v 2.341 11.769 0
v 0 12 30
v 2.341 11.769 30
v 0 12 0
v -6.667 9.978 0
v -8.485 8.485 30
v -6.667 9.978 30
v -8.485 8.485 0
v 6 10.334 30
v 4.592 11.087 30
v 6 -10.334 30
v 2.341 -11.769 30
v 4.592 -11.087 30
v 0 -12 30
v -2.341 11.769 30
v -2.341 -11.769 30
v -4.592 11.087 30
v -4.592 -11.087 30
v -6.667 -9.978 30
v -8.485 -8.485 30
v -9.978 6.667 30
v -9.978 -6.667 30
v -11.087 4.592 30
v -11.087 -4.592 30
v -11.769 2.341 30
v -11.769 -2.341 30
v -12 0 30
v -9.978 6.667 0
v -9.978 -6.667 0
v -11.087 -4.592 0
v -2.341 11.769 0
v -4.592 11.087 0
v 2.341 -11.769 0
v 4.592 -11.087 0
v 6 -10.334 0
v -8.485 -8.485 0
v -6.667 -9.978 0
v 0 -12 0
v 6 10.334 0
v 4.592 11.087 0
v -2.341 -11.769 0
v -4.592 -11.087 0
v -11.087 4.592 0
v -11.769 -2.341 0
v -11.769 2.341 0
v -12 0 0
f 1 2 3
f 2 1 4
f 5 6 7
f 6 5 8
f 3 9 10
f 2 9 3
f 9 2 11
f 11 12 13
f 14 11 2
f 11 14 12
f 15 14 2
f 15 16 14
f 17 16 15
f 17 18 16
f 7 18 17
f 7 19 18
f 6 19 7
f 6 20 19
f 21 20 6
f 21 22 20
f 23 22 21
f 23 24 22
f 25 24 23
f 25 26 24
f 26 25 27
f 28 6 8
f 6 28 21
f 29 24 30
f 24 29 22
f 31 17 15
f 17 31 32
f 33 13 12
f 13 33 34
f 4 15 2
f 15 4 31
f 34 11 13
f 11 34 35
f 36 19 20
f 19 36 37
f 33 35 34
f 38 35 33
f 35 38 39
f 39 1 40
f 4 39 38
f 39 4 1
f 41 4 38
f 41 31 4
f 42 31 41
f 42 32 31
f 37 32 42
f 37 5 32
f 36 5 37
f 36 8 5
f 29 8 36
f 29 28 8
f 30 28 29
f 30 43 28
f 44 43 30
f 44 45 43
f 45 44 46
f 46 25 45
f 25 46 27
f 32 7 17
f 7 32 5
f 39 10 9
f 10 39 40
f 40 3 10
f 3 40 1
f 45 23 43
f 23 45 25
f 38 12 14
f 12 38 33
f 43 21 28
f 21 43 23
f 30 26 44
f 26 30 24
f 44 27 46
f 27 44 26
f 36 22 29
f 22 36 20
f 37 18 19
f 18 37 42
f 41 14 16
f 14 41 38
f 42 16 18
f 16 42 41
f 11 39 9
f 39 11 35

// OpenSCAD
// A declared cylinder whose region is larger than the band that writes it.
//
// This fixture exists because of a regression that shipped green. On
// 2026-09-22 a region rule (R0 of doc/step-rungs.md) made the band pass give
// a region up when the surface covered more than the ring, in the hope the
// trimmed-quadric pass would write the whole of it. On lid10's *exact* tier
// that pass then refused - "the surface is exact but some of it is bounded off
// itself, and half a surface is worse than none" - and 56 facets that had been
// an exact conical face came out as planes. Cone faces 9 to 8, LINE 3466 to
// 3633, on a run that passed 56 of 56.
//
// Nothing saw it. lid10 is not a fixture, the flagship checks run with both
// feature flags, and no fixture asserted the exact tier's analytic coverage on
// a model where a region rule fires. This fixture is that assertion.
//
// **What it does and does not catch, mutation-checked against the parked
// attempt rather than assumed.** Rebuilt with
// `claude/step-region-r0-optimistic-parked` in the tree, this model exports
// identically and the test still passes: that rule does not fire here, because
// the two facets the cut clips have vertices on a *chord* of the wall, up to
// the sagitta inside the true cylinder, so at 1e-7 they are not on the declared
// surface and the region is exactly the ring. What this fixture guards is the
// *class* - a declared quadric written as an analytic face at the exact tier,
// with facets of the same surface beside it, so that anything which surrenders
// the band turns twenty facets into twenty planes and the count says so. The
// companion `step-region-pocket.scad` is the model where a region rule does
// fire, and it carries a derived volume.
//
// What it is: a 32-gon cylinder with one flat milled down its whole height.
// Everything below follows from r = 12, x = 6 and $fn = 32, and from nothing
// measured off the mesh.
//
//   the flat meets the cylinder where cos(theta) = 6/12, so at theta = +/-60
//   a facet spans 360/32 = 11.25 degrees, and 60/11.25 = 5.333 - NOT a facet
//   boundary, which is the whole point: the cut falls *inside* a facet at each
//   end
//   facets wholly removed: those between -60 and +60, which is 5 either side
//   of 0, so 10
//   facets clipped: the two the cut falls inside
//   facets left whole: 32 - 10 - 2 = 20
//
// So one partial band of 20, and two facets of the same declared cylinder that
// the band cannot hold because they are no longer quads.
// EXPECT: 1 surface recognised (0 toroidal, 0 spherical, 0 conical, 1 partial), 20 facets replaced
//
// The exact tier therefore writes six faces. One CYLINDRICAL_SURFACE over the
// band, and five planes: the bottom cap, the top cap, the flat - and the two
// clipped facets, which are **facets of the declared cylinder written as chord
// planes**. Those two are a defect and this fixture states it rather than
// hiding it: the region is not claimed whole. The day it is, this line becomes
// Plane=3 and the test fails, which is how that fix announces itself.
//
// ROUNDTRIP: is exhaustive by design - it has to account for every surface in
// the file - and that is what makes it the guard here. A change that surrenders
// the band does not merely lose a cylinder, it turns twenty facets into twenty
// planes, and the plane count is what says so.
// ROUNDTRIP: Cylinder=1 Plane=5
//
// Two circles, and they are the model's: the band's two rims, each an arc of
// r = 12 at z = 0 and z = 30. Everything else on the boundary is straight -
// the flat's edges, the rulings at either end of the arc, the cap polygons.
// EDGES: Circle=2
//
// With the approximation flag the corner placement moves 46 corners onto the
// exact cylinder, by at most 0.0582. Two of the planes beside the band would be
// bent by that move, so the writer fans each into triangles rather than letting
// a planar face stop being planar - which is a deliberate mechanism, not a loss:
// APPROX: 2 faces that keep a plane fanned into triangles to follow them, adding 2 faces
// APPROX: approximation found nothing left to fit
//
// so the plane count goes 5 to 7 and the cylinder count does not move. A rising
// plane count is not by itself a regression; this is what one looks like when it
// is the placement doing its job, and it is worth having a fixture that says so.
// ROUNDTRIP-APPROX: Cylinder=1 Plane=7
// EDGES-APPROX: Circle=2
//
// **No VOLUME, and the reason is the point of the fixture.** The exported solid
// is the exact cylinder over twenty facets and a chord plane over two, on caps
// that are 32-gon segments. That is neither the polygon's volume nor the
// circle's but a mixture, so any figure written here would have to be captured
// from the exporter or integrated off the tessellation - and a number taken
// from the faceted input is wrong however it is obtained. See
// doc/step-export-development.md, *Derived, not captured*. When the region is
// claimed whole and the wall is one exact face, a volume becomes derivable and
// belongs here.
//
// Every facet its maker named for a declared surface is D0 by that heritage,
// whole or cut, and has to end in a face written on that surface (checklist
// B6, B7, E8). A facet a boolean cut is not in its surface's D0 region yet -
// the region holds whole facets only - so nothing proposes it at the exact
// tier, and at the approximation tier a statistic over the tessellation
// refuses it (C3). Measured 2026-09-29:
//   approximation tier, 2 facets (2 cut): 2 on cylinder 0 (a quadric face: fewer than three facets
//     of the surface were free to claim)
//   exact tier, 2 facets (2 cut): 2 on cylinder 0 (claimed by nothing for it)
// Tolerated by name until cut facets join their region and no statistic
// vetoes a named facet (doc/step-export-wip.md, open item 34); the test
// fails the day it is no longer raised.
// KNOWN-EXPORT-ERROR: facets named by their maker for a declared surface are not written on it
$fn = 32;
difference() {
  cylinder(h = 30, r = 12);
  translate([6, -20, -1]) cube([20, 40, 32]);
}
